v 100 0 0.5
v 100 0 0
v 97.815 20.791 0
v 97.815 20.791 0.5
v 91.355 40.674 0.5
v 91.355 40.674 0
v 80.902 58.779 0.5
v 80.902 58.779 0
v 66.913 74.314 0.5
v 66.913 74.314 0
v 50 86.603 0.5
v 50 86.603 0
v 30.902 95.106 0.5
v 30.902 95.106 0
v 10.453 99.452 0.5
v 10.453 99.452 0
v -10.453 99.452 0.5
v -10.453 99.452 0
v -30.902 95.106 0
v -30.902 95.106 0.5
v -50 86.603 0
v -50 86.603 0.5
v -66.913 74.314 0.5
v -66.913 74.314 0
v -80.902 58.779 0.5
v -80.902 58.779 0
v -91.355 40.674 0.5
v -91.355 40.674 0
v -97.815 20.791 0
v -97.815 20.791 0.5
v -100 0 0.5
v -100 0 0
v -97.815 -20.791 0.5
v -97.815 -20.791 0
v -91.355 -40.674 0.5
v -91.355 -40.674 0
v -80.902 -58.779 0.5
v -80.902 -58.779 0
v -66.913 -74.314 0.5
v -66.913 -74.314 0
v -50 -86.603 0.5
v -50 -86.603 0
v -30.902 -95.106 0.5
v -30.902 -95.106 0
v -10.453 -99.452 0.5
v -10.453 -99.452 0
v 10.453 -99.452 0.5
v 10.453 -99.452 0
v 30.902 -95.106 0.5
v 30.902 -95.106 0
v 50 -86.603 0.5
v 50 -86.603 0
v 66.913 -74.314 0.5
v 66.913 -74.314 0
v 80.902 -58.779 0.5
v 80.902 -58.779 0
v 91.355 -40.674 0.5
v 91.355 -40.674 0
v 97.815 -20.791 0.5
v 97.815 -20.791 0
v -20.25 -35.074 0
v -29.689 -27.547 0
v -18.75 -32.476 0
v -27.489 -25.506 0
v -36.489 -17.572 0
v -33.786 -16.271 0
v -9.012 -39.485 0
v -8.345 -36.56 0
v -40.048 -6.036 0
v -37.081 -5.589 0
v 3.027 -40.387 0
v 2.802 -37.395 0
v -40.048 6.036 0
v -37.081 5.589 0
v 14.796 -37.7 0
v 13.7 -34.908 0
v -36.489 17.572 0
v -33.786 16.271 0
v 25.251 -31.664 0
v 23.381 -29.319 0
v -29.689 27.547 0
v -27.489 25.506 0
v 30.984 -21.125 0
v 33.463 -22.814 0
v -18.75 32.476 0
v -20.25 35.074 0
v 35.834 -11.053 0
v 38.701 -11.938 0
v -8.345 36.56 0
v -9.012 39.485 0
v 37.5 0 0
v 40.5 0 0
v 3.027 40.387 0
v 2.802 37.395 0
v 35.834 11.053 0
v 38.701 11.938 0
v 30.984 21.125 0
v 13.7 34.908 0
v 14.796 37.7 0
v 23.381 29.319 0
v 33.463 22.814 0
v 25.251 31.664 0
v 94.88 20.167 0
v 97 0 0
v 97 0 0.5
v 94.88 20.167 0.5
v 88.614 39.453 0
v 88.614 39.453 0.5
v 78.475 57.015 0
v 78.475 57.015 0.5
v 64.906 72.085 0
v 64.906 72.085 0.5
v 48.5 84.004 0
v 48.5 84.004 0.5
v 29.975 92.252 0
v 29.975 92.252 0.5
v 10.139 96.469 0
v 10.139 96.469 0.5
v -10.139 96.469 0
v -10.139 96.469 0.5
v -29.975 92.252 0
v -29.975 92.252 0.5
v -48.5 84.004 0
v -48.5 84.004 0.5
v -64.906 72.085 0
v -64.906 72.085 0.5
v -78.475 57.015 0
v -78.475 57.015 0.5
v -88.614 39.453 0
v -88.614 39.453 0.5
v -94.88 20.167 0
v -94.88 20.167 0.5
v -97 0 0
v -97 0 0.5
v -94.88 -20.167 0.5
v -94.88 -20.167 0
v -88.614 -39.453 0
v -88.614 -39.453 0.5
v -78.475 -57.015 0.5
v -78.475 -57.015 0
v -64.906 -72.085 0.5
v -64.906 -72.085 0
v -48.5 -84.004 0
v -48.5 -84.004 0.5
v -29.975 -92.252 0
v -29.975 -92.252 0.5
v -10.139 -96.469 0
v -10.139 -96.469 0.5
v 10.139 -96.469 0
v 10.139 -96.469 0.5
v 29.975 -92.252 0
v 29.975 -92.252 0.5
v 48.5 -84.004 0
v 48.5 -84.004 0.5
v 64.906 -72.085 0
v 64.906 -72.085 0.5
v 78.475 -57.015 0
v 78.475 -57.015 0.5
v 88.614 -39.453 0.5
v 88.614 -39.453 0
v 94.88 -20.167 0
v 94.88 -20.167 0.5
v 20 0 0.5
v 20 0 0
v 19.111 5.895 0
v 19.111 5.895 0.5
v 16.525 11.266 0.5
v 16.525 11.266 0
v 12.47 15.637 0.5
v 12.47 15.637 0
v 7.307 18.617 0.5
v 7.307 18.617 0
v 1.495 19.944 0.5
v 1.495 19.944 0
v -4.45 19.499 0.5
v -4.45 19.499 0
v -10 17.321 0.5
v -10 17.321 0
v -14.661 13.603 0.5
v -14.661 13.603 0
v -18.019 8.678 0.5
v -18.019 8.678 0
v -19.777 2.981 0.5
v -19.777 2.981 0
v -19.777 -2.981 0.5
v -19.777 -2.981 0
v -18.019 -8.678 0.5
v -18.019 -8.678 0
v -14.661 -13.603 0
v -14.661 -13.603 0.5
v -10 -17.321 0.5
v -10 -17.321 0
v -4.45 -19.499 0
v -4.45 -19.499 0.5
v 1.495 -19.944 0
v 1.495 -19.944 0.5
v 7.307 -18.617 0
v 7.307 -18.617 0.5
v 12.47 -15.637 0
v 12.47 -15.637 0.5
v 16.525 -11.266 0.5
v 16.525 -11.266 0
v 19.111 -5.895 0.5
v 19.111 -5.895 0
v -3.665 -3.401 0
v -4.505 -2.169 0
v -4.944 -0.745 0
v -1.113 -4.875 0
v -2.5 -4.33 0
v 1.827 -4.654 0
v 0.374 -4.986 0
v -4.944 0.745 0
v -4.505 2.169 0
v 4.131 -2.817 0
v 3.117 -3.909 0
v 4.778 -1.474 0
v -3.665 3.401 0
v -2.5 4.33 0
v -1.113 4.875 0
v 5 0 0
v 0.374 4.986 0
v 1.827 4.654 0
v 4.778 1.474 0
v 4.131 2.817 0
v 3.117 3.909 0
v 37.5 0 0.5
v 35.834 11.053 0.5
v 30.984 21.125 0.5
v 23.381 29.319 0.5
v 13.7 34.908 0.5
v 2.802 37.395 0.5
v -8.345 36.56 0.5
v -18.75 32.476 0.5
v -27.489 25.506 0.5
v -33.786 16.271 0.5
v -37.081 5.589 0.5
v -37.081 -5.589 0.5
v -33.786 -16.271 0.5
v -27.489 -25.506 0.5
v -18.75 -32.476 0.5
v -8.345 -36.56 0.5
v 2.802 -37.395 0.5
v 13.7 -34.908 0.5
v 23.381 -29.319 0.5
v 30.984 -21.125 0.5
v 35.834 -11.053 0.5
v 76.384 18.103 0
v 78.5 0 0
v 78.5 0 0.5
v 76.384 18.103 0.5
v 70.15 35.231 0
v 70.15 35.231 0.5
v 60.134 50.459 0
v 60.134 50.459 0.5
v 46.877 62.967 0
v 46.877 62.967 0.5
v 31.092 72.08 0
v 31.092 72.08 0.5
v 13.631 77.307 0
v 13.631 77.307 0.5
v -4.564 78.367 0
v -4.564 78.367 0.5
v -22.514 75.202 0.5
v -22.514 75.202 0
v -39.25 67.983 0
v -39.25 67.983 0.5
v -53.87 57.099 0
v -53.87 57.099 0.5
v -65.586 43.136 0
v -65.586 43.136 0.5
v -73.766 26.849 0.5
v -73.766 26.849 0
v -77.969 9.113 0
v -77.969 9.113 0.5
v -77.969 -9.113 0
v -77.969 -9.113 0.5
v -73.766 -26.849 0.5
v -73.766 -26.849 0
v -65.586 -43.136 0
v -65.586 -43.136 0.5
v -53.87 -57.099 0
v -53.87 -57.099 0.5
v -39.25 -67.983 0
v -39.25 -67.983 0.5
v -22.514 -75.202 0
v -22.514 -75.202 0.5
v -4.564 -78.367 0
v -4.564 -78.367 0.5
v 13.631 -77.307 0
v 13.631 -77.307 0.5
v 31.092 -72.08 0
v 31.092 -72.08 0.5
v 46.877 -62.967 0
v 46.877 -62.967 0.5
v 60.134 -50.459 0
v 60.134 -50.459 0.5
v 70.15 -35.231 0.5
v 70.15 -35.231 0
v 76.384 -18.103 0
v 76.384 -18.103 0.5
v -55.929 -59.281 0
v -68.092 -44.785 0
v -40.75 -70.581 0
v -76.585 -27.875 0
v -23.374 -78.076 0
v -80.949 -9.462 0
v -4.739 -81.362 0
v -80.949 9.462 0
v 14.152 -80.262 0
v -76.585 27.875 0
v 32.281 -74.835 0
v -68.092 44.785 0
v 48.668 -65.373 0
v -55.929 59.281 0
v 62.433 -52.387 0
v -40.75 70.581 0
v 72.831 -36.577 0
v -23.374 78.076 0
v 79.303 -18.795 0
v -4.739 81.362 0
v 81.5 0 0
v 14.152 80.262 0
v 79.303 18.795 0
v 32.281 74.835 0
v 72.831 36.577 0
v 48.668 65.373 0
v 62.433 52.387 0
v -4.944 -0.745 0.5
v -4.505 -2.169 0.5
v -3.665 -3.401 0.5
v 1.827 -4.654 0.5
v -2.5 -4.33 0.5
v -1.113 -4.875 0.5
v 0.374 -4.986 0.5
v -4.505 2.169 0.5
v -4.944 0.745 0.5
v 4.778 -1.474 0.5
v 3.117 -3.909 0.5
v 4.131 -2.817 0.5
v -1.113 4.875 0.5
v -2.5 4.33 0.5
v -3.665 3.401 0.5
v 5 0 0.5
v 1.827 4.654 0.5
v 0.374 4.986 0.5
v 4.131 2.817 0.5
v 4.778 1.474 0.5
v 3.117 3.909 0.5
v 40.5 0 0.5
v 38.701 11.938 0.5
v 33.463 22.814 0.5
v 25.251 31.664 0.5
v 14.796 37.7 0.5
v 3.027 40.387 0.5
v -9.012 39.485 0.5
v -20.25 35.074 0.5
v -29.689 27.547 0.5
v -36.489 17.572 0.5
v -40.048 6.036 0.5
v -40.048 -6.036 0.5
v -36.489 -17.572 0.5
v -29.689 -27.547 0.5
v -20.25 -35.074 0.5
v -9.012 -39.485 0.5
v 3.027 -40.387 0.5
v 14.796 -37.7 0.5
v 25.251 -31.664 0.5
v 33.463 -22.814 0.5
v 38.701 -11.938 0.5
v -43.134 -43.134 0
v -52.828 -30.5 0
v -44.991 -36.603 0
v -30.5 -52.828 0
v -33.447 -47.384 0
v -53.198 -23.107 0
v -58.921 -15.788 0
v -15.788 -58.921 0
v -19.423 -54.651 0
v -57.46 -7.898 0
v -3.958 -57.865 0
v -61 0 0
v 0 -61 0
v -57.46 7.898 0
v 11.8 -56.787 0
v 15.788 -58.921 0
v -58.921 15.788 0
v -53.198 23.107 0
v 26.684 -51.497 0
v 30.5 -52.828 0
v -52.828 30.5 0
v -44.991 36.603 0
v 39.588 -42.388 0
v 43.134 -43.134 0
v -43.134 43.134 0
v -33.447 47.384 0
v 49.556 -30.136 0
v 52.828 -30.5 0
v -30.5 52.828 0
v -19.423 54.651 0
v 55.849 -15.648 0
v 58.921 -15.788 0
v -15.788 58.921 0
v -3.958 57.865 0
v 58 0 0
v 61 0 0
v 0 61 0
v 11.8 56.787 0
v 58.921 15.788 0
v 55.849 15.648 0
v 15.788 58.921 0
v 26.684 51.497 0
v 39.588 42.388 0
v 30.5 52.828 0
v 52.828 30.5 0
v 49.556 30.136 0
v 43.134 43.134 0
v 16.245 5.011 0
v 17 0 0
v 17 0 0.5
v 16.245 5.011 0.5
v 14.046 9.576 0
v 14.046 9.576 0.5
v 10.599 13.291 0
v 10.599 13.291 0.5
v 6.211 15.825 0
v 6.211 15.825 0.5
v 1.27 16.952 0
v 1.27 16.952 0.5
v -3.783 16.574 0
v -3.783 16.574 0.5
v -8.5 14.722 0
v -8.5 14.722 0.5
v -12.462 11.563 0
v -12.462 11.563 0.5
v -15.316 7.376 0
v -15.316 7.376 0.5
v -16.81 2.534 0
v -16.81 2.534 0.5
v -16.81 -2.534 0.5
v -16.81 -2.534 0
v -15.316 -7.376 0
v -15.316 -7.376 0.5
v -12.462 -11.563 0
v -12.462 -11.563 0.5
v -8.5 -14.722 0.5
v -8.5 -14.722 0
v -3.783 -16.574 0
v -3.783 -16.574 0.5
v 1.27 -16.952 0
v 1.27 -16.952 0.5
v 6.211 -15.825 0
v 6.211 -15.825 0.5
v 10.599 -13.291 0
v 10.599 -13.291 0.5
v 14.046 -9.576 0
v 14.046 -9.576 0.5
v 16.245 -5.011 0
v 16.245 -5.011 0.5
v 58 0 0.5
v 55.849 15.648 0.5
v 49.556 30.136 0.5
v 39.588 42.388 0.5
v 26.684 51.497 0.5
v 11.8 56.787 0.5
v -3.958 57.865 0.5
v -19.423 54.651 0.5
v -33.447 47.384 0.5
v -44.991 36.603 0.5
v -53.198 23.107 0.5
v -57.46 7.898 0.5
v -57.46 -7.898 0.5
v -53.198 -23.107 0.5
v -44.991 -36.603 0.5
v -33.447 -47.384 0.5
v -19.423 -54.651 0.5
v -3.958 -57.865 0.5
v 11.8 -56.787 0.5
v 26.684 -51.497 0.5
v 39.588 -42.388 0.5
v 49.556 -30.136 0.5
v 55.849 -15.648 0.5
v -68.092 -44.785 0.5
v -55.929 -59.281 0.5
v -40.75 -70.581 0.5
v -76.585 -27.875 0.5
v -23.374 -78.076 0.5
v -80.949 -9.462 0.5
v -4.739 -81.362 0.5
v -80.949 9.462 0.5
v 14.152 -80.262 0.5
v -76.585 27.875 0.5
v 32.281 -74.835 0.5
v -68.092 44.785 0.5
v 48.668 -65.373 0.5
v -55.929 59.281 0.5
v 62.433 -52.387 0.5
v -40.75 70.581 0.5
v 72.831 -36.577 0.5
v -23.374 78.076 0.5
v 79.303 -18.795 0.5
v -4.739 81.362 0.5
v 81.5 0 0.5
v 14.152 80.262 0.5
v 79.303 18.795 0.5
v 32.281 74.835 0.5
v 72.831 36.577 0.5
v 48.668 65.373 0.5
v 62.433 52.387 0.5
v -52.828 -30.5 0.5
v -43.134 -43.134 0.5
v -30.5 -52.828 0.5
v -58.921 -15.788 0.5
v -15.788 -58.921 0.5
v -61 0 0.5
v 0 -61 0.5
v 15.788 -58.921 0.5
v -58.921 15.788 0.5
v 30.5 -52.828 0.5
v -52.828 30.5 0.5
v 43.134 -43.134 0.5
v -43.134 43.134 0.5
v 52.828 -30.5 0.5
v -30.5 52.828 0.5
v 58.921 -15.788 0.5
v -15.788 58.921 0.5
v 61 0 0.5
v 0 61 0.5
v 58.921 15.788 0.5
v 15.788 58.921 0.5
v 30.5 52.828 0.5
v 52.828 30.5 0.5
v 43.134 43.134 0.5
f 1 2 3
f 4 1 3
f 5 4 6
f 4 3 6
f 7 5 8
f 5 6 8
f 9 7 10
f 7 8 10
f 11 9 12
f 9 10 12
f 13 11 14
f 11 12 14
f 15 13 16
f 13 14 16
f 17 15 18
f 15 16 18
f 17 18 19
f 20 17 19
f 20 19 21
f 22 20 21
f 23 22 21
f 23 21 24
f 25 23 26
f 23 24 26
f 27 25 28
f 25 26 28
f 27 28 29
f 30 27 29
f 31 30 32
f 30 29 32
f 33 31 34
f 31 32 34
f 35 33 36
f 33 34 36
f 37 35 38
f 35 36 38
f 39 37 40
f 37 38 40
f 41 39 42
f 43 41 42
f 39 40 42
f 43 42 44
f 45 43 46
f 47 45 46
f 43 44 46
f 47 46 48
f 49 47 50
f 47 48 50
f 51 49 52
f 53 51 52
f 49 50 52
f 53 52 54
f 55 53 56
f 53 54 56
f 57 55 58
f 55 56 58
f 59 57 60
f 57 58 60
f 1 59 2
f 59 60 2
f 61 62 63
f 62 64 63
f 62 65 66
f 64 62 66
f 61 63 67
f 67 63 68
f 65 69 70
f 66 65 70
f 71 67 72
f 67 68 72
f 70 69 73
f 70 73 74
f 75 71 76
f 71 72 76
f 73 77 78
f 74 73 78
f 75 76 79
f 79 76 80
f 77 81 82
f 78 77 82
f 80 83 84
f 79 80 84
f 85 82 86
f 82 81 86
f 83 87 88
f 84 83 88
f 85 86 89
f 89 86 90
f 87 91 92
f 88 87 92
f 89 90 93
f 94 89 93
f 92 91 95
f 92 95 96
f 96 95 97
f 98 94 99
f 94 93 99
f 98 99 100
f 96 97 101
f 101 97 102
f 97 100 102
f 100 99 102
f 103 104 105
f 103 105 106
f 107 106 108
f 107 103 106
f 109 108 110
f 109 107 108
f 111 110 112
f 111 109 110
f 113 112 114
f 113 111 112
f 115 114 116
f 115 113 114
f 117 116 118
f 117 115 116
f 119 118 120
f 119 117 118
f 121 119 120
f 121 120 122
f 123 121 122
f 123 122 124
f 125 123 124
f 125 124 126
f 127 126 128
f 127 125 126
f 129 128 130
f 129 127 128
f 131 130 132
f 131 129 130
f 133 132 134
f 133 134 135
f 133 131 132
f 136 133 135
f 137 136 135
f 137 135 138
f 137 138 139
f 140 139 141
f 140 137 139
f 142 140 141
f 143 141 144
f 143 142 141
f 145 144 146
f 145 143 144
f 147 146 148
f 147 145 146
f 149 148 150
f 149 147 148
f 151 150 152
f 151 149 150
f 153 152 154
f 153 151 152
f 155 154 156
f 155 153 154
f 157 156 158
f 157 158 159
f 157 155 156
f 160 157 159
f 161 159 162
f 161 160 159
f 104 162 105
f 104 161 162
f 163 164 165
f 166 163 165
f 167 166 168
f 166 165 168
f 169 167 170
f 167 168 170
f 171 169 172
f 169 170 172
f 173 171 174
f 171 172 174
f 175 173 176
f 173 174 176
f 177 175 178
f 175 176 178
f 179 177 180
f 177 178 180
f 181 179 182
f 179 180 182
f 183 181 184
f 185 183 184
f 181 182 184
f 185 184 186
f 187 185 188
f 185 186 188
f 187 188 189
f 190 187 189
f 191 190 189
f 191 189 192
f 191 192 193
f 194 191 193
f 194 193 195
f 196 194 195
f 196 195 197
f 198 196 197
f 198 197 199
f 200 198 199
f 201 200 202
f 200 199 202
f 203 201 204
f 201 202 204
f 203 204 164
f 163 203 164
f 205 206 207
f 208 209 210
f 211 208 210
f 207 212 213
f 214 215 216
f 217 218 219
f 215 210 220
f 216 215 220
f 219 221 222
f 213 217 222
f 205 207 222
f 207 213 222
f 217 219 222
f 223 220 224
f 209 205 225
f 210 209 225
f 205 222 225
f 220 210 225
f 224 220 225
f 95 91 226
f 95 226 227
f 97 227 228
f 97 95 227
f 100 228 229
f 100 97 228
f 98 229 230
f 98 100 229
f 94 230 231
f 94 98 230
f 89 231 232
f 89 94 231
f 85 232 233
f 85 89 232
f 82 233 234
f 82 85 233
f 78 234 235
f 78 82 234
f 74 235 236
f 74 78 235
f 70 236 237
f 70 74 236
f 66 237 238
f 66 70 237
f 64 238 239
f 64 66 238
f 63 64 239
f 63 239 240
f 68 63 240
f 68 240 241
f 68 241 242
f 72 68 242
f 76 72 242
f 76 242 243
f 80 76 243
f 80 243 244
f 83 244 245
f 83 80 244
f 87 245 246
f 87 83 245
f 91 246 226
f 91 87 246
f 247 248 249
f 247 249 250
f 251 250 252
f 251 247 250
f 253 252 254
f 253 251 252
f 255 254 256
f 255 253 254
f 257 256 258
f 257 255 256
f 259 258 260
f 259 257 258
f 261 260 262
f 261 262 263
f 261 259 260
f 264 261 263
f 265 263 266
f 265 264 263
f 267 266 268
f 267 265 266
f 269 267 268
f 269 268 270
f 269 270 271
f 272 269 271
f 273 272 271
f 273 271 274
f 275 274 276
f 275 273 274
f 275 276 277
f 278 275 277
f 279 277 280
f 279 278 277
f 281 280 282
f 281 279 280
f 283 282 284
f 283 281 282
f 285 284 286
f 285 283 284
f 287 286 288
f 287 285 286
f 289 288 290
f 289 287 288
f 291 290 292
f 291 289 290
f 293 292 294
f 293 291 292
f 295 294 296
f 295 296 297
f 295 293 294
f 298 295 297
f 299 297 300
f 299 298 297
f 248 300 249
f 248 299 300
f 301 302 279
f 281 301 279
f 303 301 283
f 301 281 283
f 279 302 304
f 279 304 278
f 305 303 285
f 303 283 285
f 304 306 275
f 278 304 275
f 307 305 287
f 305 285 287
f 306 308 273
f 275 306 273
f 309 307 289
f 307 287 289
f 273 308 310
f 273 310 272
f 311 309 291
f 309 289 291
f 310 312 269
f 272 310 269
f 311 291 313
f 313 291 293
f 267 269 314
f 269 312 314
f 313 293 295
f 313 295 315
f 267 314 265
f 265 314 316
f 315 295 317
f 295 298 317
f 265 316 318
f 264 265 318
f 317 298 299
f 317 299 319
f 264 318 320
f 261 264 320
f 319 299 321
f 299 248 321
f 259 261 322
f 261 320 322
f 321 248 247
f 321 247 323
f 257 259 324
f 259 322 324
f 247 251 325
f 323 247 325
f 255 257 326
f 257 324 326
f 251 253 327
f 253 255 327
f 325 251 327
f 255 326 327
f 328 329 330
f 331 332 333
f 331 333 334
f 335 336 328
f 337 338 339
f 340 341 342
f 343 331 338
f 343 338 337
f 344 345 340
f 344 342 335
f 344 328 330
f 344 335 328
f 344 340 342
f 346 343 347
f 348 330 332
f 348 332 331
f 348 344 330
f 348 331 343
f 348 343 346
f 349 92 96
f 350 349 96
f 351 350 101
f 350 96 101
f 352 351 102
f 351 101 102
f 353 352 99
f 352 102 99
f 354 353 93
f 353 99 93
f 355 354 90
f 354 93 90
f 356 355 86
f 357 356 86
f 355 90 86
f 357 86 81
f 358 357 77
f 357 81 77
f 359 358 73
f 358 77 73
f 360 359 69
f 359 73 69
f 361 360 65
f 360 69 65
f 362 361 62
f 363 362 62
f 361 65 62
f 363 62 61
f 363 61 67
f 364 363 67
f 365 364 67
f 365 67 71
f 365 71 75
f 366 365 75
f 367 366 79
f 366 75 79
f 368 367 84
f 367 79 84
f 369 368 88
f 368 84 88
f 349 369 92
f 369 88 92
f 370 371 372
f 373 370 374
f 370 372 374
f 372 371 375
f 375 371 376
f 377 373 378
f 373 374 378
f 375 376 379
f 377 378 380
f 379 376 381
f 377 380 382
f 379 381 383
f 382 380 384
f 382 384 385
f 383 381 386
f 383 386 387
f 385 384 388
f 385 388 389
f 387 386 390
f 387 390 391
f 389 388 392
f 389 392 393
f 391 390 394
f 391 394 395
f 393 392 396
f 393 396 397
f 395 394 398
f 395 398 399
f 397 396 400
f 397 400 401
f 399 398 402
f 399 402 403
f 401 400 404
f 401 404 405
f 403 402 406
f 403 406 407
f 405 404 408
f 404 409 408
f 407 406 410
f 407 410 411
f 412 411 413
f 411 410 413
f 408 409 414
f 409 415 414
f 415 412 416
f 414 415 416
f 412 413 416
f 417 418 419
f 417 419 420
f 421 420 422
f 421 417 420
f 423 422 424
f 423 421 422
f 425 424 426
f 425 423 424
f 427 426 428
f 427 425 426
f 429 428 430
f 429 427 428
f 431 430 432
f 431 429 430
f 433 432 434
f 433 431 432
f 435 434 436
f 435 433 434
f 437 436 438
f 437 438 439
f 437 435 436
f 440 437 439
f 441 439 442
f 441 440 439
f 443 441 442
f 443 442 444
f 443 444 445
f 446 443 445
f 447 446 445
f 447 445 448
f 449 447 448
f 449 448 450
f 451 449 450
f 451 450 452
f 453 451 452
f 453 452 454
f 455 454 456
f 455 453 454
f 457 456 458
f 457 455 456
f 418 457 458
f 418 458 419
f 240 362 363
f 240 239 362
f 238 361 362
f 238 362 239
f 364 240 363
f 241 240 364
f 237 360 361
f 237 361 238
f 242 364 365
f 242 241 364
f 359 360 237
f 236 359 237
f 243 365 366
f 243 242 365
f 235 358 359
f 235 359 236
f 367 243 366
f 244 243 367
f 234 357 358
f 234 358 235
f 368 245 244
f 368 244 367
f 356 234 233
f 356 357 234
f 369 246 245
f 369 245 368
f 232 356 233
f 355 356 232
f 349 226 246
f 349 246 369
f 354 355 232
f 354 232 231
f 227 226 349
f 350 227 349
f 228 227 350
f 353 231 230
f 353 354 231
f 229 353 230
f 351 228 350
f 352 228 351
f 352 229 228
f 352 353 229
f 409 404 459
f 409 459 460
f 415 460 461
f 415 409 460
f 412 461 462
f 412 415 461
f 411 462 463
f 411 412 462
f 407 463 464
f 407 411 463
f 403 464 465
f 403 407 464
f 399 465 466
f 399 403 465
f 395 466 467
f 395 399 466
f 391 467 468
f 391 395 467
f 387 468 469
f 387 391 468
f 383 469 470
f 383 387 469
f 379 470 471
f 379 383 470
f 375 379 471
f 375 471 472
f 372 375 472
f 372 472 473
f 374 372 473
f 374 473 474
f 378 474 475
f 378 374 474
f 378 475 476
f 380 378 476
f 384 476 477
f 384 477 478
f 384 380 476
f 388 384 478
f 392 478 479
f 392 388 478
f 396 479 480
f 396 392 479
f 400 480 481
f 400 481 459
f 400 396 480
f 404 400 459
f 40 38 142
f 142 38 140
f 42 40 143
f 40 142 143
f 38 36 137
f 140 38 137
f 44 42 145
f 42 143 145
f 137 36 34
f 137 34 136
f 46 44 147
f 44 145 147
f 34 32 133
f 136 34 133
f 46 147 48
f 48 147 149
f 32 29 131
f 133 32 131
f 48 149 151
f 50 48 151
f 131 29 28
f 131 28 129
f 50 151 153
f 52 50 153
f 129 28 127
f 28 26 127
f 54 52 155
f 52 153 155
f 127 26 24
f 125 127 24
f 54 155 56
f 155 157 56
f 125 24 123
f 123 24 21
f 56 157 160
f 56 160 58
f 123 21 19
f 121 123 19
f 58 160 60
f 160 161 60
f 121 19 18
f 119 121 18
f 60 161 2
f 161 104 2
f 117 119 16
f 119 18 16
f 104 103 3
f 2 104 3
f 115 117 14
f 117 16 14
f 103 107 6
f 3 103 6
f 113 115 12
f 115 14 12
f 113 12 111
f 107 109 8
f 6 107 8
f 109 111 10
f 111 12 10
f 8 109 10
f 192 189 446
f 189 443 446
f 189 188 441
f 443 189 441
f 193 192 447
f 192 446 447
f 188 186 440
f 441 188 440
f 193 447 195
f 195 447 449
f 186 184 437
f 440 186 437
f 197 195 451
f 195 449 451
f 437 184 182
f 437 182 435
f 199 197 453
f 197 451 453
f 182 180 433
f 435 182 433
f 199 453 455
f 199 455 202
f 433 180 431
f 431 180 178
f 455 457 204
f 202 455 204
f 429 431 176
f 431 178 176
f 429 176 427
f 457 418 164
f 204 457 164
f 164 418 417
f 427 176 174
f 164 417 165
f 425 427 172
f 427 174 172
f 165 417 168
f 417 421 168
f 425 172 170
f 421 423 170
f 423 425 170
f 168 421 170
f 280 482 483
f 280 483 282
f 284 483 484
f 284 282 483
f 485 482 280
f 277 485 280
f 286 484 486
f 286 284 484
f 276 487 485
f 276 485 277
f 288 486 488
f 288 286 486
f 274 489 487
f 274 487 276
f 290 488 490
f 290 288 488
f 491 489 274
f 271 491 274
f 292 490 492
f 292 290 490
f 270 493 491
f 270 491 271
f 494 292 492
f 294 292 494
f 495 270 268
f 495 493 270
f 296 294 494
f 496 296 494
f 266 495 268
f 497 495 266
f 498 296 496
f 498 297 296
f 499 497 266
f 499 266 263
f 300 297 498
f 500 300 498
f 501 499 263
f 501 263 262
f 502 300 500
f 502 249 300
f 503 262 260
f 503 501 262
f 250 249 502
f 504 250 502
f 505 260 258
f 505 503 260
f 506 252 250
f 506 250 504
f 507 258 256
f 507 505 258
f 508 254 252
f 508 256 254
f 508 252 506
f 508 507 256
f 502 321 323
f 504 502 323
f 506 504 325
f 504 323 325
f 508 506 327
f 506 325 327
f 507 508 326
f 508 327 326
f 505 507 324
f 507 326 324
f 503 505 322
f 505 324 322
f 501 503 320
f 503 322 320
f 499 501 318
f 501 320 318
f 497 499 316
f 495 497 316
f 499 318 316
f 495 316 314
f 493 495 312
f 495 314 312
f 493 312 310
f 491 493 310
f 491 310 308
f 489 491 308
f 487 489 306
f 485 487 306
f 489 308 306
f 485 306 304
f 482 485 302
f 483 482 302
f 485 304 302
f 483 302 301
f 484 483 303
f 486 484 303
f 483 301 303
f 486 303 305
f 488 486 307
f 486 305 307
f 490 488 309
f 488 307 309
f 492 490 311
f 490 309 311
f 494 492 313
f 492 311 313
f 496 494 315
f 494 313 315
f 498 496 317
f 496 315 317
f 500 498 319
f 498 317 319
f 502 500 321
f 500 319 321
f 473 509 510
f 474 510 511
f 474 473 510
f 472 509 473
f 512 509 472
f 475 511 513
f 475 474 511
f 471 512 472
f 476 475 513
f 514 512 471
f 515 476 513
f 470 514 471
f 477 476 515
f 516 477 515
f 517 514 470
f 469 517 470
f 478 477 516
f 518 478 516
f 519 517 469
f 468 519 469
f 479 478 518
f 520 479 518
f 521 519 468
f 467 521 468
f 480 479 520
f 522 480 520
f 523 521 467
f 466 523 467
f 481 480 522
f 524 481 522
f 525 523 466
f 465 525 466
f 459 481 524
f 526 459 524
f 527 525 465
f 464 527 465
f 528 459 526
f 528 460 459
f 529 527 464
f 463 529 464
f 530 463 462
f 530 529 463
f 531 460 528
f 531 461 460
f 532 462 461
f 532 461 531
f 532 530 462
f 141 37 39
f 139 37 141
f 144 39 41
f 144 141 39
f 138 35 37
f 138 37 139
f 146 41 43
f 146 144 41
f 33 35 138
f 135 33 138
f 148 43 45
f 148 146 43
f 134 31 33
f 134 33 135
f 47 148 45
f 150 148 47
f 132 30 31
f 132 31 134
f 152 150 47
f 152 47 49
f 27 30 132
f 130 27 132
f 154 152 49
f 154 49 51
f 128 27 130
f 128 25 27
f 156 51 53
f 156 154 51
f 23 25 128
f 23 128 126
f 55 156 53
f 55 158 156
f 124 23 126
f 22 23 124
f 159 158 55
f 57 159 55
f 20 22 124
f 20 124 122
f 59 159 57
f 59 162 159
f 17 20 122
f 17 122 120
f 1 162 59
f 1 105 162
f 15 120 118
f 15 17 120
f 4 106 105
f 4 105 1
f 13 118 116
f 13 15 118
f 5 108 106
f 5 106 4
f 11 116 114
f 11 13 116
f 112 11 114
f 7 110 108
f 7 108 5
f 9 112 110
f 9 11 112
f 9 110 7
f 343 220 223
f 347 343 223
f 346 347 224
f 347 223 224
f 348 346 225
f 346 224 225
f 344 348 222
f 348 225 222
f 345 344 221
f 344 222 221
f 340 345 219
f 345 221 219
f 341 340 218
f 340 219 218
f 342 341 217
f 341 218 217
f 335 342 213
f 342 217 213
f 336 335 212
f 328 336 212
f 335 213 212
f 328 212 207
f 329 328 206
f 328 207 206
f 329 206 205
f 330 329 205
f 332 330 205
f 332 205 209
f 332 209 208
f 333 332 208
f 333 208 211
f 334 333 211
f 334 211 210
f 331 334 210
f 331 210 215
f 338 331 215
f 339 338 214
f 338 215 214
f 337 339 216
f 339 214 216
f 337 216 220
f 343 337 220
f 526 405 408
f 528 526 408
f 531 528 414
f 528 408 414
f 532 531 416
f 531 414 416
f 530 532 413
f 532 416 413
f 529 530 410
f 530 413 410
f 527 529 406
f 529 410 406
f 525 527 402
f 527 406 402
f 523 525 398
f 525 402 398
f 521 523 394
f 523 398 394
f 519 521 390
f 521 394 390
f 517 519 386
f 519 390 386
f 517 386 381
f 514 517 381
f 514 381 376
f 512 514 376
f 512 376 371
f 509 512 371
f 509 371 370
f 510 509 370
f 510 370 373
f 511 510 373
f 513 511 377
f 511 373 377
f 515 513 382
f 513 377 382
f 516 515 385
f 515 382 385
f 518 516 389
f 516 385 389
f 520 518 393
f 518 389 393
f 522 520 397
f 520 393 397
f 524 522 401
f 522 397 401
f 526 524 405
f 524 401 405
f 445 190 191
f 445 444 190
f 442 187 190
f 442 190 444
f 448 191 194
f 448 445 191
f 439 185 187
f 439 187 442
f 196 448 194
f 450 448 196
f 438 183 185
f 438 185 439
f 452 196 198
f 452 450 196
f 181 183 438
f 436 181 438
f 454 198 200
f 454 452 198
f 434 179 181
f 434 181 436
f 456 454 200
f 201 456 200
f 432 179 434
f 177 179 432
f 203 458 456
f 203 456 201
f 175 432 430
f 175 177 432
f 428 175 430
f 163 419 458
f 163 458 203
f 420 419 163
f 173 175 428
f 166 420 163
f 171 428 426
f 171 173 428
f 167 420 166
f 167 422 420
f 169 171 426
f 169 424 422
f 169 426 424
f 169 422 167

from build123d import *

# Parameters (mm, degrees)
F0_R     = 100
F0_R_2   = 97
F0_R_3   = 81.5
F0_R_4   = 78.5
F0_R_5   = 61
F0_R_6   = 58
F0_R_7   = 40.5
F0_R_8   = 37.500001
F0_R_9   = 20
F0_R_10  = 17
F0_R_11  = 5
F1_DEPTH = 0.5


with BuildPart() as f1:
    # F0 (on Top) → F1 (new body)
    with BuildSketch(Plane.XY):
        Circle(F0_R)
        Circle(F0_R_2, mode=Mode.SUBTRACT)
        Circle(F0_R_3)
        Circle(F0_R_4, mode=Mode.SUBTRACT)
        Circle(F0_R_5)
        Circle(F0_R_6, mode=Mode.SUBTRACT)
        Circle(F0_R_7)
        Circle(F0_R_8, mode=Mode.SUBTRACT)
        Circle(F0_R_9)
        Circle(F0_R_10, mode=Mode.SUBTRACT)
        Circle(F0_R_11)
    extrude(amount=F1_DEPTH)


solid = f1.part
